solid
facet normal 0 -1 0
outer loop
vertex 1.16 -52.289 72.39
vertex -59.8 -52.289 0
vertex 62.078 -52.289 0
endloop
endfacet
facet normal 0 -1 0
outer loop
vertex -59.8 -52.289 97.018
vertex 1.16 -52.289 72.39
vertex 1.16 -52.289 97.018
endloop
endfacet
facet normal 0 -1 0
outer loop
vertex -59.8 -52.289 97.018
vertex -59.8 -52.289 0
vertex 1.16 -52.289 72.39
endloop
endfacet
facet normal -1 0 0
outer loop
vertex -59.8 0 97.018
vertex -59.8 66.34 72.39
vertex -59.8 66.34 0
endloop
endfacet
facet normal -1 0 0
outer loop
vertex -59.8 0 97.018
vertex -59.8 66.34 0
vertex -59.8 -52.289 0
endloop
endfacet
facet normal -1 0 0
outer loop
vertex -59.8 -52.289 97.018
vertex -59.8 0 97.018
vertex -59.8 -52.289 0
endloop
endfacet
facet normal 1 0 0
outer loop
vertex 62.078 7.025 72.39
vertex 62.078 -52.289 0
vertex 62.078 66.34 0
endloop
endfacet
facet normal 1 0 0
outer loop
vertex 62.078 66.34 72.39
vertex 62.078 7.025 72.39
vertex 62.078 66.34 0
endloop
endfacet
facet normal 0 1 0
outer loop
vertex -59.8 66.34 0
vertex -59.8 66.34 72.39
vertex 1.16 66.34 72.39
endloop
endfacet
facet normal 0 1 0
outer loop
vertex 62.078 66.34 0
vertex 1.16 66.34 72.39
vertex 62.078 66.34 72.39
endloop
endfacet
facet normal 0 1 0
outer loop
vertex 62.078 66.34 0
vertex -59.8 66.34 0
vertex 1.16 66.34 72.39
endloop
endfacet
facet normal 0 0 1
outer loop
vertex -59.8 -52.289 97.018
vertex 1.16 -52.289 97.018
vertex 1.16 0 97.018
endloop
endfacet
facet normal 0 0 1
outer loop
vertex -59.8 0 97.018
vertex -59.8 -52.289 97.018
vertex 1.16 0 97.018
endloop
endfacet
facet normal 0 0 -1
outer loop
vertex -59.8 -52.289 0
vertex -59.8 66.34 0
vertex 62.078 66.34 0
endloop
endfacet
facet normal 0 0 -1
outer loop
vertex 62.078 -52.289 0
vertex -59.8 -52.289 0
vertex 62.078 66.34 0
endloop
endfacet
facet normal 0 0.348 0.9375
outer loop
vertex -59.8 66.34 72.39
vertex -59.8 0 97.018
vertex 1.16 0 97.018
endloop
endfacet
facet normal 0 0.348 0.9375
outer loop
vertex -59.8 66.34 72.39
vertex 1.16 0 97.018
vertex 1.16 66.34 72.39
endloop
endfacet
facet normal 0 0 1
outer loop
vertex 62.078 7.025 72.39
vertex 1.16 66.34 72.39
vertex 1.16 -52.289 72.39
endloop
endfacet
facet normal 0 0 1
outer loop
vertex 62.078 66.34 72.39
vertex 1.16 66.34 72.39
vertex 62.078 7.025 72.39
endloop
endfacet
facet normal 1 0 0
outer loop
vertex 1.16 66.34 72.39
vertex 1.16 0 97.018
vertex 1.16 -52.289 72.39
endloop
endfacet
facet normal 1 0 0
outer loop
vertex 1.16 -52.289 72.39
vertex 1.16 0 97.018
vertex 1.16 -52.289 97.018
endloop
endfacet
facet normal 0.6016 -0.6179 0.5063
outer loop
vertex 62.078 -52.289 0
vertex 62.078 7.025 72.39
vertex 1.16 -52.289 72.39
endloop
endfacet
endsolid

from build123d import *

# Parameters (mm, degrees)
F0_W     = 121.8784451485
F0_H     = 118.6291240156
F1_DEPTH = 72.39
F3_DEPTH = 60.96
F7_DEPTH = 49.1183372137


with BuildPart() as f1:
    # F0 (on Top) → F1 (new body)
    with BuildSketch(Plane.XY):
        with Locations((1.138780266, 7.0254523307)):
            Rectangle(F0_W, F0_H)
    extrude(amount=F1_DEPTH)

    # F2 (on face) → F3 (join)
    with BuildSketch(Plane(origin=(-59.8004423082, 0, 0), x_dir=(0, -1, 0), z_dir=(-1, 0, 0))):
        Polygon((-66.3400143385, 72.39), (52.2891096771, 72.39), (52.2891096771, 97.0183685422), (0, 97.0183685422), align=None)
    extrude(amount=-F3_DEPTH)

    # F6 (on 3pt) → F7 (cut, through all)
    with BuildSketch(Plane(origin=(41.9043027589, -43.0374073868, 35.2637791007), x_dir=(-0.7987945895, -0.4653434391, 0.3812908174), z_dir=(-0.6016038595, 0.6178714042, -0.5062684309))):
        Polygon((-25.255178673, 60.4466734116), (-25.255178673, -33.1403415326), (51.0077879865, 22.8536668575), align=None)
    extrude(amount=-F7_DEPTH, mode=Mode.SUBTRACT)


solid = f1.part
